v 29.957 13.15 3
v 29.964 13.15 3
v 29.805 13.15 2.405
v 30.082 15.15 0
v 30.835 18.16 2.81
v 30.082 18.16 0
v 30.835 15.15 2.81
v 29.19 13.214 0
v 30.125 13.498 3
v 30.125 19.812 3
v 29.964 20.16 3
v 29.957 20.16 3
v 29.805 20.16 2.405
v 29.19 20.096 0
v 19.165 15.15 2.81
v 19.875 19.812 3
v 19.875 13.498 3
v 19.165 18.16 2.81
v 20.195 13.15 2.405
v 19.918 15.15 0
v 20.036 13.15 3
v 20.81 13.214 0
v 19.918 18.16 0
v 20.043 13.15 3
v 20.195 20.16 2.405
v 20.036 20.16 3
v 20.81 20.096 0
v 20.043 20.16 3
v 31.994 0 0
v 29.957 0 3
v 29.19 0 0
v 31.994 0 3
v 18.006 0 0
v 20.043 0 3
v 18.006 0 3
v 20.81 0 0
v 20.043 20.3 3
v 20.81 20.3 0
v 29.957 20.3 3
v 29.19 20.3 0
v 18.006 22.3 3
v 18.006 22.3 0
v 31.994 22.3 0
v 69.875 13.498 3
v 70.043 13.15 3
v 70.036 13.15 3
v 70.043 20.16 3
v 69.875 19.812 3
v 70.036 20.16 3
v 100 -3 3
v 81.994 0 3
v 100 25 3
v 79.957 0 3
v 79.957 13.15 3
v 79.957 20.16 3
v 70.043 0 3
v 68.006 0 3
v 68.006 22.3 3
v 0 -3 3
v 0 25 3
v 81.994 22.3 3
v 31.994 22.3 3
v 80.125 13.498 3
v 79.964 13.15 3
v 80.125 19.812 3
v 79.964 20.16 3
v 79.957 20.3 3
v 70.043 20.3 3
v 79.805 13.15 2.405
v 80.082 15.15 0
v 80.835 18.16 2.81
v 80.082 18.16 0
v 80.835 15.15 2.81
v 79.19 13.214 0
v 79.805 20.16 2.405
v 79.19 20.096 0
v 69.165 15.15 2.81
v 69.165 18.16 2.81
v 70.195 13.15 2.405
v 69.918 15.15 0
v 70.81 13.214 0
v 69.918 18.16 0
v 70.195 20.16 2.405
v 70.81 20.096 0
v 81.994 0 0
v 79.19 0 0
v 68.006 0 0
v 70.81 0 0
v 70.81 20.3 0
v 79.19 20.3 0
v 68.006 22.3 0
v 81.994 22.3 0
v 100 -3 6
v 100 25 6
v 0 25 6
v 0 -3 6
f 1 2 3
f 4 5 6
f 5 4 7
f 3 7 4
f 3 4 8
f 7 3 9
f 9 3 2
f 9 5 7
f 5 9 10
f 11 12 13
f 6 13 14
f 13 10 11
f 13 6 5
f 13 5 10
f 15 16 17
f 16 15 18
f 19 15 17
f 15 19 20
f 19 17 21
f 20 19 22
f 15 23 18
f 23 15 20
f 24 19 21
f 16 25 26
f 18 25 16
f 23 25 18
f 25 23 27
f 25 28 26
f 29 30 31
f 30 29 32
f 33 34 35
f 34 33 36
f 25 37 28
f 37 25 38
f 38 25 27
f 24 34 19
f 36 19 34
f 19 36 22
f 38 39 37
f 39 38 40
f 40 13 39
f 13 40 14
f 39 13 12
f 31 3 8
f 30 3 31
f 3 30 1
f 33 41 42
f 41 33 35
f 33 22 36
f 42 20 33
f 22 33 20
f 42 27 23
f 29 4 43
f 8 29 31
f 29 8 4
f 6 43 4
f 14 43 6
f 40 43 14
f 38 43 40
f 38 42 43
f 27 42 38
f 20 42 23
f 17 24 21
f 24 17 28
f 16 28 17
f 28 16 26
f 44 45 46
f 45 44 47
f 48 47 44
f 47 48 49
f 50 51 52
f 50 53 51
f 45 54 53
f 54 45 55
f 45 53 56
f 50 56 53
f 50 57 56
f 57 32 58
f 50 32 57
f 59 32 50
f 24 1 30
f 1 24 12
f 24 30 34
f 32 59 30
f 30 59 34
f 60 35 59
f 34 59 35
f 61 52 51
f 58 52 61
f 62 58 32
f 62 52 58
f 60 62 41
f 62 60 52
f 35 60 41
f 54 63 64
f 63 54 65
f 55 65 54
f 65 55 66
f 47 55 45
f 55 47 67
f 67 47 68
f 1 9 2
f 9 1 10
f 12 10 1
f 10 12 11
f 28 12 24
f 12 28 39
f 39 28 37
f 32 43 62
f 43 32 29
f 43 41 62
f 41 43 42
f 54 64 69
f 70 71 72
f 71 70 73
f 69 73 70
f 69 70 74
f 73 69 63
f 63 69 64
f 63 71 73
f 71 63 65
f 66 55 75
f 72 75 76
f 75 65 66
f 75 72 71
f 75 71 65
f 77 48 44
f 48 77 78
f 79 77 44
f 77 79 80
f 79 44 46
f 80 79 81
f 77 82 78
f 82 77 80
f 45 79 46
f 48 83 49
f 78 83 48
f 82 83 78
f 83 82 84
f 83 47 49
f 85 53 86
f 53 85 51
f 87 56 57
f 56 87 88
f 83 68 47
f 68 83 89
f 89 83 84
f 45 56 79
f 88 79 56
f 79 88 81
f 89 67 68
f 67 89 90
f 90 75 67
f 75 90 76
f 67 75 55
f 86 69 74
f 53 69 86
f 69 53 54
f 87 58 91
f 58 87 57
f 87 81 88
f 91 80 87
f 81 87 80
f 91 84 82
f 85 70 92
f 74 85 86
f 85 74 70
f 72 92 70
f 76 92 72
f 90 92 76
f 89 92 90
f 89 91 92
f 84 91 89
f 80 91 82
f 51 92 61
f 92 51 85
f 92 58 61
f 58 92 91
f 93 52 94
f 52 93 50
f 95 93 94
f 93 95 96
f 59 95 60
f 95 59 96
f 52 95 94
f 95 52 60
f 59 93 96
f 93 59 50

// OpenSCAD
// file: ../modules/female_dovetail.scad
// Female Dovetail with Integrated Boss and Inner Catch Recesses
// Creates a rectangular boss with trapezoidal channel cut into it
// Catch recesses in INNER channel walls for snap-fit latch
// Uses hull() approach for intuitive geometry definition

include <../dimensions.scad>

function dovetail_top_width(base_width, height, angle) =
    base_width + 2 * height * tan(angle);

// Female dovetail - boss with channel cut into it
// Origin at center of boss top surface (where it attaches to panel)
// Boss extends in -Z direction, channel opens toward -Z
//
// The hull() approach connects two rectangles at different Z positions:
// - Narrow rectangle at Z=0 (panel surface, where male locks in)
// - Wide rectangle at Z=-height (entry point for male dovetail)
//
module female_dovetail(
    length = scaled_dovetail_length,
    height = scaled_dovetail_height,
    base_width = scaled_dovetail_base_width,
    angle = dovetail_angle,
    clearance = scaled_clearance,
    margin = scaled_boss_margin,
    // Catch recess parameters
    with_catch_windows = true,
    catch_height = scaled_catch_height,
    catch_length = scaled_catch_length,
    ramp_length = scaled_catch_ramp_length,
    window_clearance = scaled_window_clearance
) {
    // Channel dimensions with clearance
    narrow_width = base_width + 2 * clearance;      // at Z=0 (top)
    wide_width = dovetail_top_width(narrow_width, height + clearance, angle);  // at Z=-height (bottom)
    channel_length = length + 2 * clearance;

    // Boss dimensions
    boss_width = wide_width + 2 * margin;
    boss_depth = channel_length + margin;
    boss_height = height;

    // Recess dimensions (sized for catch bump + clearance)
    recess_depth = catch_height + window_clearance;  // How far into wall at plateau

    // Y positions for ramped recess sections (matching male catch)
    // Male catch positioned so exit ramp ends at length/2
    recess_y_start = length/2 - 2 * ramp_length - catch_length;

    // Section boundaries
    entry_ramp_end = recess_y_start + ramp_length;
    plateau_end = entry_ramp_end + catch_length;
    exit_ramp_end = plateau_end + ramp_length;  // = length/2

    rotate([0, 180, 0])
    difference() {
        // Rectangular boss extending in -Z
        translate([-boss_width/2, -channel_length/2, -boss_height])
            cube([boss_width, boss_depth, boss_height]);

        // Channel + recesses as single union (same coordinate system)
        union() {
            // Trapezoidal channel via hull of two thin cubes
            hull() {
                // Narrow rectangle at top (Z=0), extends slightly above for clean cut
                translate([0, 0, clearance])
                    cube([narrow_width, channel_length, 0.01], center=true);

                // Wide rectangle at bottom (Z=-height)
                translate([0, 0, -height - clearance])
                    cube([wide_width, channel_length, 0.01], center=true);
            }

            // Inner channel recesses - ramped to match male catch profile
            // Rotated to follow the sloped channel walls
            if (with_catch_windows) {
                // Left recess (negative X side) - rotate to follow wall slope
                translate([-narrow_width/2, 0, 0])
                rotate([0, angle, 0])
                translate([narrow_width/2, 0, 0])
                union() {
                    // Entry ramp (0 → full depth)
                    hull() {
                        translate([-narrow_width/2 - 0.01, recess_y_start, -height - clearance])
                            cube([0.02, 0.01, height + 2*clearance]);
                        translate([-narrow_width/2 - recess_depth, entry_ramp_end, -height - clearance])
                            cube([recess_depth, 0.01, height + 2*clearance]);
                    }
                    // Plateau (full depth)
                    translate([-narrow_width/2 - recess_depth, entry_ramp_end, -height - clearance])
                        cube([recess_depth, catch_length, height + 2*clearance]);
                    // Exit ramp (full depth → 0)
                    hull() {
                        translate([-narrow_width/2 - recess_depth, plateau_end, -height - clearance])
                            cube([recess_depth, 0.01, height + 2*clearance]);
                        translate([-narrow_width/2 - 0.01, exit_ramp_end, -height - clearance])
                            cube([0.02, 0.01, height + 2*clearance]);
                    }
                }

                // Right recess (positive X side) - rotate to follow wall slope
                translate([narrow_width/2, 0, 0])
                rotate([0, -angle, 0])
                translate([-narrow_width/2, 0, 0])
                union() {
                    // Entry ramp (0 → full depth)
                    hull() {
                        translate([narrow_width/2 - 0.01, recess_y_start, -height - clearance])
                            cube([0.02, 0.01, height + 2*clearance]);
                        translate([narrow_width/2, entry_ramp_end, -height - clearance])
                            cube([recess_depth, 0.01, height + 2*clearance]);
                    }
                    // Plateau (full depth)
                    translate([narrow_width/2, entry_ramp_end, -height - clearance])
                        cube([recess_depth, catch_length, height + 2*clearance]);
                    // Exit ramp (full depth → 0)
                    hull() {
                        translate([narrow_width/2, plateau_end, -height - clearance])
                            cube([recess_depth, 0.01, height + 2*clearance]);
                        translate([narrow_width/2 - 0.01, exit_ramp_end, -height - clearance])
                            cube([0.02, 0.01, height + 2*clearance]);
                    }
                }
            }
        }
    }
}

// Test visualization
color("gray") female_dovetail();
// file: ../dimensions.scad
// Shared Dimensions for Dovetailed Shell
// Include this file to access all dimension variables

// Panel dimensions
panel_width = 100;           // X dimension
panel_depth = 25;           // Y dimension
panel_height = 10;          // Z dimension (for vertical panels)
top_panel_thickness = 3;     // Top/bottom panel thickness (same as wall)
wall_panel_thickness = 3;    // Side/front/back panel thickness

// Dovetail parameters
dovetail_angle = 15;         // Angle from vertical (degrees)
dovetail_height = 3;         // Trapezoid height (mm)
dovetail_length = 20;        // Length along edge (mm)
dovetail_base_width = 8;     // Width at narrow end (mm)
dovetail_clearance = 0.15;   // Clearance per side (mm) - reduced from 0.3 to fix loose fit
dovetail_edge_inset = 3;     // Inset from panel edge (mm)

// Boss parameters (raised sections for female dovetails)
dovetail_boss_height = dovetail_height;  // Boss height = channel depth
dovetail_boss_margin = 2;                // Extra wall around dovetail channel

// Center-slot latch parameters (integrated snap-fit retention)
// Slot runs through center of dovetail, allowing squeeze-to-insert/release
center_slot_width = 3;          // mm - flex gap width
center_slot_end_margin = 6;       // mm - solid material at each end of slot

// Catch bump parameters (ramped profile on outer dovetail faces)
catch_bump_height = 0.8;          // mm - protrusion from dovetail surface
catch_bump_length = 3;            // mm - length along insertion direction
catch_ramp_angle = 35;            // degrees - entry ramp angle
catch_ramp_length = 2;            // mm - length of entry ramp
catch_retention_length = 1;       // mm - vertical retention face length
catch_position_from_end = 2;      // mm - catch position from free end

// Female window parameters (external access for release)
window_clearance = 0.10;          // mm - clearance around catch (reduced for tighter fit)
window_finger_depth = 5;          // mm - depth for finger access to squeeze

// Scale factor for prototyping
scale_factor = 1.0;

// Scaled dimensions (computed)
scaled_width = panel_width * scale_factor;
scaled_depth = panel_depth * scale_factor;
scaled_height = panel_height * scale_factor;
scaled_top_thickness = top_panel_thickness * scale_factor;
scaled_wall_thickness = wall_panel_thickness * scale_factor;
scaled_dovetail_height = dovetail_height * scale_factor;
scaled_dovetail_length = dovetail_length * scale_factor;
scaled_dovetail_base_width = dovetail_base_width * scale_factor;
scaled_clearance = dovetail_clearance * scale_factor;
scaled_boss_height = dovetail_boss_height * scale_factor;
scaled_boss_margin = dovetail_boss_margin * scale_factor;

// Scaled center-slot latch parameters
scaled_slot_width = center_slot_width * scale_factor;
scaled_slot_end_margin = center_slot_end_margin * scale_factor;
scaled_catch_height = catch_bump_height * scale_factor;
scaled_catch_length = catch_bump_length * scale_factor;
scaled_catch_ramp_length = catch_ramp_length * scale_factor;
scaled_catch_retention_length = catch_retention_length * scale_factor;
scaled_catch_position = catch_position_from_end * scale_factor;
scaled_window_clearance = window_clearance * scale_factor;
scaled_window_depth = window_finger_depth * scale_factor;
// main file
// Top Panel with Female Dovetails (Boss-Based Design)
// Two female dovetail channels on front edge to mate with front panel
// Uses female_dovetail_boss module for raised boss sections

include <../dimensions.scad>
use <../modules/female_dovetail.scad>

module top_panel(
    width = scaled_width,
    depth = scaled_depth,
    thickness = scaled_top_thickness,
    dt_angle = dovetail_angle,
    dt_height = scaled_dovetail_height,
    dt_length = scaled_dovetail_length,
    dt_base_width = scaled_dovetail_base_width,
    dt_clearance = scaled_clearance,
    boss_margin = scaled_boss_margin
) {
    union() {
        // Base panel (standard thickness)
        // Raised by dovetail height so dovetails hang underneath
        // Extended 3mm forward so front edge is flush with front panel
        // Origin at corner, panel extends in +X, +Y, +Z
        translate([0, -thickness, dt_height])
            cube([width, depth + thickness, thickness]);

        // Left female dovetail at 1/4 width
        // Position at front edge (Y offset for dovetail center)
        translate([width/4, dt_length/2 + dt_clearance, 0])
            female_dovetail(
                length = dt_length,
                height = dt_height,
                base_width = dt_base_width,
                angle = dt_angle,
                clearance = dt_clearance,
                margin = boss_margin
            );

        // Right female dovetail at 3/4 width
        translate([width*3/4, dt_length/2 + dt_clearance, 0])
            female_dovetail(
                length = dt_length,
                height = dt_height,
                base_width = dt_base_width,
                angle = dt_angle,
                clearance = dt_clearance,
                margin = boss_margin
            );
    }
}

// Render the panel
color("LightGray") top_panel();
